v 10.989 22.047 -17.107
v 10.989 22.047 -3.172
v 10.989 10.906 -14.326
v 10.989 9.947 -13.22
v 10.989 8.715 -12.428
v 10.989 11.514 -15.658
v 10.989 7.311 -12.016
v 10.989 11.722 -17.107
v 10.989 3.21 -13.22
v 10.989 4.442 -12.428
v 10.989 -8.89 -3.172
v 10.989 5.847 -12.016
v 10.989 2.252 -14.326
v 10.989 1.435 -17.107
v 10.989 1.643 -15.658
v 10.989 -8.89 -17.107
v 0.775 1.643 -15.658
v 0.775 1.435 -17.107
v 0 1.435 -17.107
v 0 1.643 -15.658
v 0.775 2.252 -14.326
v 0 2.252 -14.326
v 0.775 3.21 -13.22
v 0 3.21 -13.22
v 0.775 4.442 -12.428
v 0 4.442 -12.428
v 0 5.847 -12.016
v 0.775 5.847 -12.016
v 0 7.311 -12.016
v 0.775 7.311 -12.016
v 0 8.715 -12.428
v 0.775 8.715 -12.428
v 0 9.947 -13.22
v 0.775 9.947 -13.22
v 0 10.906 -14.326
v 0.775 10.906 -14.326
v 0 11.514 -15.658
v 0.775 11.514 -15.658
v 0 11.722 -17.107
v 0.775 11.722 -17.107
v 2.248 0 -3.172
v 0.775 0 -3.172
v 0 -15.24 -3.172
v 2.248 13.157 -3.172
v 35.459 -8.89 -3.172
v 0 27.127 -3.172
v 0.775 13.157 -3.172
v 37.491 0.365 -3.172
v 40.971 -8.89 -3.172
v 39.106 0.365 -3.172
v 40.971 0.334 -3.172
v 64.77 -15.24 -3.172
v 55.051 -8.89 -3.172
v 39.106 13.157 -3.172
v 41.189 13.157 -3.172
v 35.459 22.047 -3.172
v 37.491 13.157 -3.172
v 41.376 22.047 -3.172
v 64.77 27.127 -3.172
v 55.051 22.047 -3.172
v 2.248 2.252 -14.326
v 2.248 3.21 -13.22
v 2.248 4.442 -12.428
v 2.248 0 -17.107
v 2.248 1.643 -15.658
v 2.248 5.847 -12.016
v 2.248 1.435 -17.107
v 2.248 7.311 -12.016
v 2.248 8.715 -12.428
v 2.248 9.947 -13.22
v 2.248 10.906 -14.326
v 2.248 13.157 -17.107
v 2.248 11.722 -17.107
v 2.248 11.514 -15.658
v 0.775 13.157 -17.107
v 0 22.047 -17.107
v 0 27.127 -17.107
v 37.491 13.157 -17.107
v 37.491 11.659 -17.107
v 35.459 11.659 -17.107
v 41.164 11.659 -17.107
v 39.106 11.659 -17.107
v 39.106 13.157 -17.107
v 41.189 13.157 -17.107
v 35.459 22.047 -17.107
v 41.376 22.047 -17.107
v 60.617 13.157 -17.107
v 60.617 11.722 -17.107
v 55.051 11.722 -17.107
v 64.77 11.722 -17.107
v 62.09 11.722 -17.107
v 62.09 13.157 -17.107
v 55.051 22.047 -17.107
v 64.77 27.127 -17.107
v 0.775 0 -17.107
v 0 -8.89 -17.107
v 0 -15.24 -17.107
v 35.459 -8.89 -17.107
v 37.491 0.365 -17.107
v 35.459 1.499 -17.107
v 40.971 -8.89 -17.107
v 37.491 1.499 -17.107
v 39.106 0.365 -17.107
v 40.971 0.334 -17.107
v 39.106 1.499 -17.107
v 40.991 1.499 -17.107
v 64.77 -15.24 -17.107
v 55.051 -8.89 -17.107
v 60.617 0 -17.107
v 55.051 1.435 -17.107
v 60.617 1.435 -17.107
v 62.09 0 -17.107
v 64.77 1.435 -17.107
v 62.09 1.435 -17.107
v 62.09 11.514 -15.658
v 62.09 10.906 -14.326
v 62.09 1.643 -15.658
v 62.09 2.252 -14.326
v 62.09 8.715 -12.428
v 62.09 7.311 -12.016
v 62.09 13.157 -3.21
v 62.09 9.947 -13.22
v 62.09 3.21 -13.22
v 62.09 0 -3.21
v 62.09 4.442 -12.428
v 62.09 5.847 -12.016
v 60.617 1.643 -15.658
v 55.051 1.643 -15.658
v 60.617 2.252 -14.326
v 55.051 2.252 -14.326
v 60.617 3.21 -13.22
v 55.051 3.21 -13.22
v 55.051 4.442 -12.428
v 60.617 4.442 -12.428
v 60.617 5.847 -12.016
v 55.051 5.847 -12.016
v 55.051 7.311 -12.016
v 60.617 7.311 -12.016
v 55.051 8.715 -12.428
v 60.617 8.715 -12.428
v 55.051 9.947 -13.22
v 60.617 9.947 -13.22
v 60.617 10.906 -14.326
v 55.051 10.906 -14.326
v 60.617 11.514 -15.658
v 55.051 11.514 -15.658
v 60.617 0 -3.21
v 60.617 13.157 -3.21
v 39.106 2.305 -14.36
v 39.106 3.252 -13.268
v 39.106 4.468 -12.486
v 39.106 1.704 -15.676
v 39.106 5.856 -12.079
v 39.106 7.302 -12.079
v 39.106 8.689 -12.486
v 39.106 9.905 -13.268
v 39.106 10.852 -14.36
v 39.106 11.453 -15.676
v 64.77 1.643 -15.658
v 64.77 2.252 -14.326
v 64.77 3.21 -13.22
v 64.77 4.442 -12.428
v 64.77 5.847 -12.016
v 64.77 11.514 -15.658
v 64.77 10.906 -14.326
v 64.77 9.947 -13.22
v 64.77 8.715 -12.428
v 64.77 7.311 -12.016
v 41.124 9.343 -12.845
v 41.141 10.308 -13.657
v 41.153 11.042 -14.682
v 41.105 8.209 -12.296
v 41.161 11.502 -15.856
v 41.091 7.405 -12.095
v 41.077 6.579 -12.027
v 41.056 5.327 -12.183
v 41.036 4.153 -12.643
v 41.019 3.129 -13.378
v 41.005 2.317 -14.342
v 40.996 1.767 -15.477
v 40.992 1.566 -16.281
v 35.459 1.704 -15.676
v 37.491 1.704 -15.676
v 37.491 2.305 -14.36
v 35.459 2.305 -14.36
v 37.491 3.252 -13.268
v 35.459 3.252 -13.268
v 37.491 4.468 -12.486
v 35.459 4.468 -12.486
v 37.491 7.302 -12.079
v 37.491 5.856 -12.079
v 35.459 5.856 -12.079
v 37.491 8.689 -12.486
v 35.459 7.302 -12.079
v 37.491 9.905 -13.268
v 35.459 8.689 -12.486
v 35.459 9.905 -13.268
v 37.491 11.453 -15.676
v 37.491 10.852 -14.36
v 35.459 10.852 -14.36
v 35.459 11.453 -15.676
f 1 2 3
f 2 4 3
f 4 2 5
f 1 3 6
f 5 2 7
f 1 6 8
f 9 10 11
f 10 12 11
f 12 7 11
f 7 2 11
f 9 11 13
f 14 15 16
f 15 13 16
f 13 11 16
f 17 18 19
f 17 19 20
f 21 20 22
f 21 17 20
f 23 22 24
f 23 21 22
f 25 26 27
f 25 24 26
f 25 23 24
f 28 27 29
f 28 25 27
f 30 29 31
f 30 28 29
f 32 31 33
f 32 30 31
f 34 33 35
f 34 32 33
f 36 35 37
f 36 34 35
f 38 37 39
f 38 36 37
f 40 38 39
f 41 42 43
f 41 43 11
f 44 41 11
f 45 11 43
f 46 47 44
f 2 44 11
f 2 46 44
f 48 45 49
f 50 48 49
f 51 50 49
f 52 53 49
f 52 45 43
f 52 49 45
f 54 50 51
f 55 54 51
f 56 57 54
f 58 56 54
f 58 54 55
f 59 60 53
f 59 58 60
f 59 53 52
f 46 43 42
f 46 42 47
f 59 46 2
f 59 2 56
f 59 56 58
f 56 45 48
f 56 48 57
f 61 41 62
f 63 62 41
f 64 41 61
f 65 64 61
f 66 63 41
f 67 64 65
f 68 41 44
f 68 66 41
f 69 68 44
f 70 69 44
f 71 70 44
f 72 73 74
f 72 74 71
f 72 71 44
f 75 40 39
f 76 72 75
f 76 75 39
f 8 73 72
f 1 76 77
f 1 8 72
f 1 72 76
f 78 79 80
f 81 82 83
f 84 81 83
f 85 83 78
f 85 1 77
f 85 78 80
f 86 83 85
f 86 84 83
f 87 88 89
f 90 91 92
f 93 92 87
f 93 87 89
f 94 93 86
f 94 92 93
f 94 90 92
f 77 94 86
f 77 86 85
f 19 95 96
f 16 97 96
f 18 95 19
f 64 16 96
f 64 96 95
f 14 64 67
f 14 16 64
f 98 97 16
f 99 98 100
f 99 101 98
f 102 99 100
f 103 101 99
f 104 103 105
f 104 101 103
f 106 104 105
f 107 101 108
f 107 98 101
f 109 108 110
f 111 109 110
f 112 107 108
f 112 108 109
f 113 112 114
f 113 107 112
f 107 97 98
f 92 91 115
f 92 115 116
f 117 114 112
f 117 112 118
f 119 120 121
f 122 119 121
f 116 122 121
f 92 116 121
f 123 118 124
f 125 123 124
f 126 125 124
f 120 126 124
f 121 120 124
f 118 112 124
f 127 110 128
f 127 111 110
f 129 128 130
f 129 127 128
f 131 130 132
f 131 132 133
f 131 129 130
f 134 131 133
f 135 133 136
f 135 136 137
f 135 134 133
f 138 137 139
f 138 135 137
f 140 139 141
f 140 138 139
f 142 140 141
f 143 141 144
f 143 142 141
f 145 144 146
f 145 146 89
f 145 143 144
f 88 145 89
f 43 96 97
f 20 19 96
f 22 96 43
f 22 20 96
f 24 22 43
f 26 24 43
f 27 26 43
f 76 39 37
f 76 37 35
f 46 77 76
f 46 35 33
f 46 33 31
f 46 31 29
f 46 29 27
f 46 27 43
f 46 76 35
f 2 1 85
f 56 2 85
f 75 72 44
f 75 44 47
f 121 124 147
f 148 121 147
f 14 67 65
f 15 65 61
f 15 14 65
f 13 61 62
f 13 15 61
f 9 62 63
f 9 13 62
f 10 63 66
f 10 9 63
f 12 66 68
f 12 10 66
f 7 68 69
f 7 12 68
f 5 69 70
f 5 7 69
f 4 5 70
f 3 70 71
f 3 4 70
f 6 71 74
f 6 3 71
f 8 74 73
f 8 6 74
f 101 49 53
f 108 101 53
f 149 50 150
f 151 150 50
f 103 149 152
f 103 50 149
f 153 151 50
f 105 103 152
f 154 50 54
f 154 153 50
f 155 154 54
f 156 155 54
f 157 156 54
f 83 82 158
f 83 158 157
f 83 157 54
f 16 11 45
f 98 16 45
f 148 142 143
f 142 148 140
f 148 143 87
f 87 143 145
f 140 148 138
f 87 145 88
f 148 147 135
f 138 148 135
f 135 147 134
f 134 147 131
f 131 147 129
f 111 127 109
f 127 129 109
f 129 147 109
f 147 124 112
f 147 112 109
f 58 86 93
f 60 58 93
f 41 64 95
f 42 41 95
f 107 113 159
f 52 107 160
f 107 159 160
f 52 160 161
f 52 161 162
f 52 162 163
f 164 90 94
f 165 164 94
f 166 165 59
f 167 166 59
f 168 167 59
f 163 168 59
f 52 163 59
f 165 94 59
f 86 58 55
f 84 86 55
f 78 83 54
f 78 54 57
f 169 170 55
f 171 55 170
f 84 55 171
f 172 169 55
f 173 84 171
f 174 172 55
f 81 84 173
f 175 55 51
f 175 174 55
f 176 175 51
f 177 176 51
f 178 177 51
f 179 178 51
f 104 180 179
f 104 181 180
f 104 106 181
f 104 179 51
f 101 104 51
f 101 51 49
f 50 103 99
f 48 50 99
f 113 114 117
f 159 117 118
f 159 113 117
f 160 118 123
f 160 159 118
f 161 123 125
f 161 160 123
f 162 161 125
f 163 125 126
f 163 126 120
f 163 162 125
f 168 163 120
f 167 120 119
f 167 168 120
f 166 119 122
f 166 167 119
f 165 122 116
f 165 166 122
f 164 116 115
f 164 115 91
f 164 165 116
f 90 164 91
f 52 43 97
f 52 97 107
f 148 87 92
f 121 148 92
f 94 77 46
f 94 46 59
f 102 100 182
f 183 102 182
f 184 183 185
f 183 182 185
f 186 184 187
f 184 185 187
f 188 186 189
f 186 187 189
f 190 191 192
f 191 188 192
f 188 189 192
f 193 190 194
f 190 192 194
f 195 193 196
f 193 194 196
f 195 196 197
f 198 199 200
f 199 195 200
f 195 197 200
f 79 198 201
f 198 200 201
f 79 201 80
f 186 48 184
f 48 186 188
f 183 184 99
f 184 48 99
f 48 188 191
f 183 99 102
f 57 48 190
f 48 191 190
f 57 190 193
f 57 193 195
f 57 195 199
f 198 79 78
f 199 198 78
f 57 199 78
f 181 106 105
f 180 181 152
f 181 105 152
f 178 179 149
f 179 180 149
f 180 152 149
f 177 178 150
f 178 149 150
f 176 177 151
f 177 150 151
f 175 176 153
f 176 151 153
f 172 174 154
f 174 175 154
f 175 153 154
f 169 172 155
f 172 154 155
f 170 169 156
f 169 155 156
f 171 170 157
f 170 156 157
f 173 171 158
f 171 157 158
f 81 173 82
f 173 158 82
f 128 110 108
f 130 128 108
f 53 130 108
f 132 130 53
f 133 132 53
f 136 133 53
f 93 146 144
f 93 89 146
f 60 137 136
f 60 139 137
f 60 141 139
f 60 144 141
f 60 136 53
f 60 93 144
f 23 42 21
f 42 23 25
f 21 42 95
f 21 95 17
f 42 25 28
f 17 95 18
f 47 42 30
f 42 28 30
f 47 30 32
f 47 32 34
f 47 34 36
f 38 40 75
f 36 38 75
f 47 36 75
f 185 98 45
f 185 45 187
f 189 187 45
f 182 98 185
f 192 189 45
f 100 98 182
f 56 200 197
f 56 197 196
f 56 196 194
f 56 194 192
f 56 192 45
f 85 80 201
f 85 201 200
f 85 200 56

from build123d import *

# Parameters (mm, degrees)
BOSS_EXTRUDE1_DEPTH     = 13.1572
BOSS_EXTRUDE2_DEPTH     = 8.89
SKETCH3_W               = 66.04
SKETCH3_H               = 20.285187831
BOSS_EXTRUDE3_DEPTH     = 5.08
BOSS_EXTRUDE4_DEPTH     = 8.89
CUT_EXTRUDE1_DEPTH      = 64.71104446
CUT_EXTRUDE1_DEPTH_BACK = 64.71104446
SKETCH6_R               = 5.1435
SKETCH7_W               = 66.04
SKETCH7_H               = 20.285187831
BOSS_EXTRUDE5_DEPTH     = 25.4
SKETCH9_W               = 1.615391333
SKETCH9_H               = 12.791830428
BOSS_EXTRUDE6_DEPTH     = 19.05
SKETCH10_R              = 5.08
CUT_EXTRUDE2_DEPTH      = 15.24
CUT_EXTRUDE3_DEPTH      = 1.27
SKETCH14_W              = 1.4732
SKETCH14_H              = 13.1572
CUT_EXTRUDE4_DEPTH      = 15.24
SKETCH15_W              = 64.77
SKETCH15_H              = 20.285187831
CUT_EXTRUDE5_DEPTH      = 19.05
BOSS_EXTRUDE7_DEPTH     = 1.4986
SKETCH17_W              = 64.77
SKETCH17_H              = 42.3672
CUT_EXTRUDE7_DEPTH      = 6.35


with BuildPart() as part:
    # Sketch1 → Boss-Extrude1 (new body)
    with BuildSketch(Plane(origin=(0, 0, 0), x_dir=(1, 0, 0), z_dir=(0, 1, 0))):
        Polygon((3.949839476, 3.210057439), (3.949839476, 17.1069), (0, 17.1069), (0, 0), (0, -3.178287831), (66.04, -3.178287831), (66.04, 0), (66.04, 17.1069), (62.090160524, 17.1069), (62.090160524, 3.210057439), (60.616960524, 3.210057439), (60.616960524, 17.1069), (55.050578368, 17.1069), (55.050578368, 3.210057439), (55.050578368, 0), (10.989421632, 0), (10.989421632, 3.210057439), (10.989421632, 17.1069), (5.423039476, 17.1069), (5.423039476, 3.210057439), align=None)
    extrude(amount=BOSS_EXTRUDE1_DEPTH)

    # Sketch2 → Boss-Extrude2 (add)
    with BuildSketch(Plane(origin=(0, 13.1572, 0), x_dir=(1, 0, 0), z_dir=(0, 1, 0))):
        Polygon((10.989421632, 17.1069), (0, 17.1069), (0, -3.178287831), (66.04, -3.178287831), (66.04, 17.1069), (55.050578368, 17.1069), (55.050578368, -0.226283794), (10.989421632, 0), align=None)
    extrude(amount=BOSS_EXTRUDE2_DEPTH)

    # Sketch3 → Boss-Extrude3 (add)
    with BuildSketch(Plane(origin=(0, 22.0472, 0), x_dir=(1, 0, 0), z_dir=(0, 1, 0))):
        with Locations((33.02, 6.964306084)):
            Rectangle(SKETCH3_W, SKETCH3_H)
    extrude(amount=BOSS_EXTRUDE3_DEPTH)

    # Sketch4 → Boss-Extrude4 (add)
    with BuildSketch(Plane.XZ):
        Polygon((66.04, -17.1069), (55.050578368, -17.1069), (55.050578368, 0), (10.989421632, 0), (10.989421632, -17.1069), (0, -17.1069), (0, 3.178287831), (66.04, 3.178287831), align=None)
    extrude(amount=BOSS_EXTRUDE4_DEPTH)

    # Sketch6 → Cut-Extrude1 (cut, two sides: drawn at the far end of the back side and taken through both)
    with BuildSketch(Plane.ZY.offset(-55.050578368).offset(-CUT_EXTRUDE1_DEPTH_BACK)):
        with Locations((-17.1069, 6.5786)):
            Circle(SKETCH6_R)
    extrude(amount=CUT_EXTRUDE1_DEPTH + CUT_EXTRUDE1_DEPTH_BACK, mode=Mode.SUBTRACT)

    # Sketch7 → Boss-Extrude5 (add)
    with BuildSketch(Plane.XZ.offset(8.89)):
        with Locations((33.02, -6.964306084)):
            Rectangle(SKETCH7_W, SKETCH7_H)
    extrude(amount=BOSS_EXTRUDE5_DEPTH)

    # Sketch9 → Boss-Extrude6 (add)
    with BuildSketch(Plane(origin=(0, 0, -17.1069), x_dir=(-1, 0, 0), z_dir=(0, 0, -1))):
        Polygon((-41.375896334, 22.0472), (-41.18906329, 13.1572), (-40.971249817, 0.333691876), (-40.971249817, -8.89), (-37.490871957, -8.89), (-35.458871957, -8.89), (-35.458871957, 13.1572), (-35.458871957, 22.0472), align=None)
        with Locations((-38.298567624, 6.761284786)):
            Rectangle(SKETCH9_W, SKETCH9_H, mode=Mode.SUBTRACT)
    extrude(amount=-BOSS_EXTRUDE6_DEPTH)

    # Sketch10 → Cut-Extrude2 (cut)
    with BuildSketch(Plane.ZY.offset(-35.458871957)):
        with Locations((-17.1069, 6.5786)):
            Circle(SKETCH10_R)
    extrude(amount=-CUT_EXTRUDE2_DEPTH, mode=Mode.SUBTRACT)

    # Sketch12 → Cut-Extrude3 (cut)
    with BuildSketch(Plane(origin=(66.04, 0, 0), x_dir=(0, 0, -1), z_dir=(1, 0, 0))):
        Polygon((17.1069, 27.1272), (17.1069, 11.7221), (17.1069, 1.4351), (17.1069, -34.29), (-3.178287831, -34.29), (-3.52610715, 27.1272), align=None)
    extrude(amount=-CUT_EXTRUDE3_DEPTH, mode=Mode.SUBTRACT)

    # Sketch14 → Cut-Extrude4 (cut)
    with BuildSketch(Plane(origin=(0, 0, -17.1069), x_dir=(-1, 0, 0), z_dir=(0, 0, -1))):
        with Locations((-4.686439476, 6.5786)):
            Rectangle(SKETCH14_W, SKETCH14_H)
        with Locations((-1.511439476, 6.5786)):
            Rectangle(SKETCH14_W, SKETCH14_H)
    extrude(amount=-CUT_EXTRUDE4_DEPTH, mode=Mode.SUBTRACT)

    # Sketch15 → Cut-Extrude5 (cut)
    with BuildSketch(Plane.XZ.offset(34.29)):
        with Locations((32.385, -6.964306084)):
            Rectangle(SKETCH15_W, SKETCH15_H)
    extrude(amount=-CUT_EXTRUDE5_DEPTH, mode=Mode.SUBTRACT)

    # Sketch16 → Boss-Extrude7 (add)
    with BuildSketch(Plane.ZY.offset(-5.423039476)):
        with BuildLine():
            Line((-17.1069, 13.1572), (6.075816752, 13.1572))
            Line((6.075816752, 13.1572), (6.075816752, 0))
            Line((6.075816752, 0), (-17.1069, 0))
            Line((-17.1069, 0), (-17.1069, 1.4351))
            ThreePointArc((-17.1069, 1.4351), (-11.9634, 6.5786), (-17.1069, 11.7221))
            Line((-17.1069, 11.7221), (-17.1069, 13.1572))
        make_face()
    extrude(amount=BOSS_EXTRUDE7_DEPTH)

    # Sketch17 → Cut-Extrude7 (cut)
    with BuildSketch(Plane.XY.offset(3.178287831)):
        with Locations((32.385, 5.9436)):
            Rectangle(SKETCH17_W, SKETCH17_H)
    extrude(amount=-CUT_EXTRUDE7_DEPTH, mode=Mode.SUBTRACT)


with BuildPart() as body_2:
    # of the pieces the cut leaves, the one that is kept (cut_extrude7_keep)
    add(part.part.solids().sort_by_distance((10.989421632, 11.7221, -17.1069))[0])


solid = body_2.part
